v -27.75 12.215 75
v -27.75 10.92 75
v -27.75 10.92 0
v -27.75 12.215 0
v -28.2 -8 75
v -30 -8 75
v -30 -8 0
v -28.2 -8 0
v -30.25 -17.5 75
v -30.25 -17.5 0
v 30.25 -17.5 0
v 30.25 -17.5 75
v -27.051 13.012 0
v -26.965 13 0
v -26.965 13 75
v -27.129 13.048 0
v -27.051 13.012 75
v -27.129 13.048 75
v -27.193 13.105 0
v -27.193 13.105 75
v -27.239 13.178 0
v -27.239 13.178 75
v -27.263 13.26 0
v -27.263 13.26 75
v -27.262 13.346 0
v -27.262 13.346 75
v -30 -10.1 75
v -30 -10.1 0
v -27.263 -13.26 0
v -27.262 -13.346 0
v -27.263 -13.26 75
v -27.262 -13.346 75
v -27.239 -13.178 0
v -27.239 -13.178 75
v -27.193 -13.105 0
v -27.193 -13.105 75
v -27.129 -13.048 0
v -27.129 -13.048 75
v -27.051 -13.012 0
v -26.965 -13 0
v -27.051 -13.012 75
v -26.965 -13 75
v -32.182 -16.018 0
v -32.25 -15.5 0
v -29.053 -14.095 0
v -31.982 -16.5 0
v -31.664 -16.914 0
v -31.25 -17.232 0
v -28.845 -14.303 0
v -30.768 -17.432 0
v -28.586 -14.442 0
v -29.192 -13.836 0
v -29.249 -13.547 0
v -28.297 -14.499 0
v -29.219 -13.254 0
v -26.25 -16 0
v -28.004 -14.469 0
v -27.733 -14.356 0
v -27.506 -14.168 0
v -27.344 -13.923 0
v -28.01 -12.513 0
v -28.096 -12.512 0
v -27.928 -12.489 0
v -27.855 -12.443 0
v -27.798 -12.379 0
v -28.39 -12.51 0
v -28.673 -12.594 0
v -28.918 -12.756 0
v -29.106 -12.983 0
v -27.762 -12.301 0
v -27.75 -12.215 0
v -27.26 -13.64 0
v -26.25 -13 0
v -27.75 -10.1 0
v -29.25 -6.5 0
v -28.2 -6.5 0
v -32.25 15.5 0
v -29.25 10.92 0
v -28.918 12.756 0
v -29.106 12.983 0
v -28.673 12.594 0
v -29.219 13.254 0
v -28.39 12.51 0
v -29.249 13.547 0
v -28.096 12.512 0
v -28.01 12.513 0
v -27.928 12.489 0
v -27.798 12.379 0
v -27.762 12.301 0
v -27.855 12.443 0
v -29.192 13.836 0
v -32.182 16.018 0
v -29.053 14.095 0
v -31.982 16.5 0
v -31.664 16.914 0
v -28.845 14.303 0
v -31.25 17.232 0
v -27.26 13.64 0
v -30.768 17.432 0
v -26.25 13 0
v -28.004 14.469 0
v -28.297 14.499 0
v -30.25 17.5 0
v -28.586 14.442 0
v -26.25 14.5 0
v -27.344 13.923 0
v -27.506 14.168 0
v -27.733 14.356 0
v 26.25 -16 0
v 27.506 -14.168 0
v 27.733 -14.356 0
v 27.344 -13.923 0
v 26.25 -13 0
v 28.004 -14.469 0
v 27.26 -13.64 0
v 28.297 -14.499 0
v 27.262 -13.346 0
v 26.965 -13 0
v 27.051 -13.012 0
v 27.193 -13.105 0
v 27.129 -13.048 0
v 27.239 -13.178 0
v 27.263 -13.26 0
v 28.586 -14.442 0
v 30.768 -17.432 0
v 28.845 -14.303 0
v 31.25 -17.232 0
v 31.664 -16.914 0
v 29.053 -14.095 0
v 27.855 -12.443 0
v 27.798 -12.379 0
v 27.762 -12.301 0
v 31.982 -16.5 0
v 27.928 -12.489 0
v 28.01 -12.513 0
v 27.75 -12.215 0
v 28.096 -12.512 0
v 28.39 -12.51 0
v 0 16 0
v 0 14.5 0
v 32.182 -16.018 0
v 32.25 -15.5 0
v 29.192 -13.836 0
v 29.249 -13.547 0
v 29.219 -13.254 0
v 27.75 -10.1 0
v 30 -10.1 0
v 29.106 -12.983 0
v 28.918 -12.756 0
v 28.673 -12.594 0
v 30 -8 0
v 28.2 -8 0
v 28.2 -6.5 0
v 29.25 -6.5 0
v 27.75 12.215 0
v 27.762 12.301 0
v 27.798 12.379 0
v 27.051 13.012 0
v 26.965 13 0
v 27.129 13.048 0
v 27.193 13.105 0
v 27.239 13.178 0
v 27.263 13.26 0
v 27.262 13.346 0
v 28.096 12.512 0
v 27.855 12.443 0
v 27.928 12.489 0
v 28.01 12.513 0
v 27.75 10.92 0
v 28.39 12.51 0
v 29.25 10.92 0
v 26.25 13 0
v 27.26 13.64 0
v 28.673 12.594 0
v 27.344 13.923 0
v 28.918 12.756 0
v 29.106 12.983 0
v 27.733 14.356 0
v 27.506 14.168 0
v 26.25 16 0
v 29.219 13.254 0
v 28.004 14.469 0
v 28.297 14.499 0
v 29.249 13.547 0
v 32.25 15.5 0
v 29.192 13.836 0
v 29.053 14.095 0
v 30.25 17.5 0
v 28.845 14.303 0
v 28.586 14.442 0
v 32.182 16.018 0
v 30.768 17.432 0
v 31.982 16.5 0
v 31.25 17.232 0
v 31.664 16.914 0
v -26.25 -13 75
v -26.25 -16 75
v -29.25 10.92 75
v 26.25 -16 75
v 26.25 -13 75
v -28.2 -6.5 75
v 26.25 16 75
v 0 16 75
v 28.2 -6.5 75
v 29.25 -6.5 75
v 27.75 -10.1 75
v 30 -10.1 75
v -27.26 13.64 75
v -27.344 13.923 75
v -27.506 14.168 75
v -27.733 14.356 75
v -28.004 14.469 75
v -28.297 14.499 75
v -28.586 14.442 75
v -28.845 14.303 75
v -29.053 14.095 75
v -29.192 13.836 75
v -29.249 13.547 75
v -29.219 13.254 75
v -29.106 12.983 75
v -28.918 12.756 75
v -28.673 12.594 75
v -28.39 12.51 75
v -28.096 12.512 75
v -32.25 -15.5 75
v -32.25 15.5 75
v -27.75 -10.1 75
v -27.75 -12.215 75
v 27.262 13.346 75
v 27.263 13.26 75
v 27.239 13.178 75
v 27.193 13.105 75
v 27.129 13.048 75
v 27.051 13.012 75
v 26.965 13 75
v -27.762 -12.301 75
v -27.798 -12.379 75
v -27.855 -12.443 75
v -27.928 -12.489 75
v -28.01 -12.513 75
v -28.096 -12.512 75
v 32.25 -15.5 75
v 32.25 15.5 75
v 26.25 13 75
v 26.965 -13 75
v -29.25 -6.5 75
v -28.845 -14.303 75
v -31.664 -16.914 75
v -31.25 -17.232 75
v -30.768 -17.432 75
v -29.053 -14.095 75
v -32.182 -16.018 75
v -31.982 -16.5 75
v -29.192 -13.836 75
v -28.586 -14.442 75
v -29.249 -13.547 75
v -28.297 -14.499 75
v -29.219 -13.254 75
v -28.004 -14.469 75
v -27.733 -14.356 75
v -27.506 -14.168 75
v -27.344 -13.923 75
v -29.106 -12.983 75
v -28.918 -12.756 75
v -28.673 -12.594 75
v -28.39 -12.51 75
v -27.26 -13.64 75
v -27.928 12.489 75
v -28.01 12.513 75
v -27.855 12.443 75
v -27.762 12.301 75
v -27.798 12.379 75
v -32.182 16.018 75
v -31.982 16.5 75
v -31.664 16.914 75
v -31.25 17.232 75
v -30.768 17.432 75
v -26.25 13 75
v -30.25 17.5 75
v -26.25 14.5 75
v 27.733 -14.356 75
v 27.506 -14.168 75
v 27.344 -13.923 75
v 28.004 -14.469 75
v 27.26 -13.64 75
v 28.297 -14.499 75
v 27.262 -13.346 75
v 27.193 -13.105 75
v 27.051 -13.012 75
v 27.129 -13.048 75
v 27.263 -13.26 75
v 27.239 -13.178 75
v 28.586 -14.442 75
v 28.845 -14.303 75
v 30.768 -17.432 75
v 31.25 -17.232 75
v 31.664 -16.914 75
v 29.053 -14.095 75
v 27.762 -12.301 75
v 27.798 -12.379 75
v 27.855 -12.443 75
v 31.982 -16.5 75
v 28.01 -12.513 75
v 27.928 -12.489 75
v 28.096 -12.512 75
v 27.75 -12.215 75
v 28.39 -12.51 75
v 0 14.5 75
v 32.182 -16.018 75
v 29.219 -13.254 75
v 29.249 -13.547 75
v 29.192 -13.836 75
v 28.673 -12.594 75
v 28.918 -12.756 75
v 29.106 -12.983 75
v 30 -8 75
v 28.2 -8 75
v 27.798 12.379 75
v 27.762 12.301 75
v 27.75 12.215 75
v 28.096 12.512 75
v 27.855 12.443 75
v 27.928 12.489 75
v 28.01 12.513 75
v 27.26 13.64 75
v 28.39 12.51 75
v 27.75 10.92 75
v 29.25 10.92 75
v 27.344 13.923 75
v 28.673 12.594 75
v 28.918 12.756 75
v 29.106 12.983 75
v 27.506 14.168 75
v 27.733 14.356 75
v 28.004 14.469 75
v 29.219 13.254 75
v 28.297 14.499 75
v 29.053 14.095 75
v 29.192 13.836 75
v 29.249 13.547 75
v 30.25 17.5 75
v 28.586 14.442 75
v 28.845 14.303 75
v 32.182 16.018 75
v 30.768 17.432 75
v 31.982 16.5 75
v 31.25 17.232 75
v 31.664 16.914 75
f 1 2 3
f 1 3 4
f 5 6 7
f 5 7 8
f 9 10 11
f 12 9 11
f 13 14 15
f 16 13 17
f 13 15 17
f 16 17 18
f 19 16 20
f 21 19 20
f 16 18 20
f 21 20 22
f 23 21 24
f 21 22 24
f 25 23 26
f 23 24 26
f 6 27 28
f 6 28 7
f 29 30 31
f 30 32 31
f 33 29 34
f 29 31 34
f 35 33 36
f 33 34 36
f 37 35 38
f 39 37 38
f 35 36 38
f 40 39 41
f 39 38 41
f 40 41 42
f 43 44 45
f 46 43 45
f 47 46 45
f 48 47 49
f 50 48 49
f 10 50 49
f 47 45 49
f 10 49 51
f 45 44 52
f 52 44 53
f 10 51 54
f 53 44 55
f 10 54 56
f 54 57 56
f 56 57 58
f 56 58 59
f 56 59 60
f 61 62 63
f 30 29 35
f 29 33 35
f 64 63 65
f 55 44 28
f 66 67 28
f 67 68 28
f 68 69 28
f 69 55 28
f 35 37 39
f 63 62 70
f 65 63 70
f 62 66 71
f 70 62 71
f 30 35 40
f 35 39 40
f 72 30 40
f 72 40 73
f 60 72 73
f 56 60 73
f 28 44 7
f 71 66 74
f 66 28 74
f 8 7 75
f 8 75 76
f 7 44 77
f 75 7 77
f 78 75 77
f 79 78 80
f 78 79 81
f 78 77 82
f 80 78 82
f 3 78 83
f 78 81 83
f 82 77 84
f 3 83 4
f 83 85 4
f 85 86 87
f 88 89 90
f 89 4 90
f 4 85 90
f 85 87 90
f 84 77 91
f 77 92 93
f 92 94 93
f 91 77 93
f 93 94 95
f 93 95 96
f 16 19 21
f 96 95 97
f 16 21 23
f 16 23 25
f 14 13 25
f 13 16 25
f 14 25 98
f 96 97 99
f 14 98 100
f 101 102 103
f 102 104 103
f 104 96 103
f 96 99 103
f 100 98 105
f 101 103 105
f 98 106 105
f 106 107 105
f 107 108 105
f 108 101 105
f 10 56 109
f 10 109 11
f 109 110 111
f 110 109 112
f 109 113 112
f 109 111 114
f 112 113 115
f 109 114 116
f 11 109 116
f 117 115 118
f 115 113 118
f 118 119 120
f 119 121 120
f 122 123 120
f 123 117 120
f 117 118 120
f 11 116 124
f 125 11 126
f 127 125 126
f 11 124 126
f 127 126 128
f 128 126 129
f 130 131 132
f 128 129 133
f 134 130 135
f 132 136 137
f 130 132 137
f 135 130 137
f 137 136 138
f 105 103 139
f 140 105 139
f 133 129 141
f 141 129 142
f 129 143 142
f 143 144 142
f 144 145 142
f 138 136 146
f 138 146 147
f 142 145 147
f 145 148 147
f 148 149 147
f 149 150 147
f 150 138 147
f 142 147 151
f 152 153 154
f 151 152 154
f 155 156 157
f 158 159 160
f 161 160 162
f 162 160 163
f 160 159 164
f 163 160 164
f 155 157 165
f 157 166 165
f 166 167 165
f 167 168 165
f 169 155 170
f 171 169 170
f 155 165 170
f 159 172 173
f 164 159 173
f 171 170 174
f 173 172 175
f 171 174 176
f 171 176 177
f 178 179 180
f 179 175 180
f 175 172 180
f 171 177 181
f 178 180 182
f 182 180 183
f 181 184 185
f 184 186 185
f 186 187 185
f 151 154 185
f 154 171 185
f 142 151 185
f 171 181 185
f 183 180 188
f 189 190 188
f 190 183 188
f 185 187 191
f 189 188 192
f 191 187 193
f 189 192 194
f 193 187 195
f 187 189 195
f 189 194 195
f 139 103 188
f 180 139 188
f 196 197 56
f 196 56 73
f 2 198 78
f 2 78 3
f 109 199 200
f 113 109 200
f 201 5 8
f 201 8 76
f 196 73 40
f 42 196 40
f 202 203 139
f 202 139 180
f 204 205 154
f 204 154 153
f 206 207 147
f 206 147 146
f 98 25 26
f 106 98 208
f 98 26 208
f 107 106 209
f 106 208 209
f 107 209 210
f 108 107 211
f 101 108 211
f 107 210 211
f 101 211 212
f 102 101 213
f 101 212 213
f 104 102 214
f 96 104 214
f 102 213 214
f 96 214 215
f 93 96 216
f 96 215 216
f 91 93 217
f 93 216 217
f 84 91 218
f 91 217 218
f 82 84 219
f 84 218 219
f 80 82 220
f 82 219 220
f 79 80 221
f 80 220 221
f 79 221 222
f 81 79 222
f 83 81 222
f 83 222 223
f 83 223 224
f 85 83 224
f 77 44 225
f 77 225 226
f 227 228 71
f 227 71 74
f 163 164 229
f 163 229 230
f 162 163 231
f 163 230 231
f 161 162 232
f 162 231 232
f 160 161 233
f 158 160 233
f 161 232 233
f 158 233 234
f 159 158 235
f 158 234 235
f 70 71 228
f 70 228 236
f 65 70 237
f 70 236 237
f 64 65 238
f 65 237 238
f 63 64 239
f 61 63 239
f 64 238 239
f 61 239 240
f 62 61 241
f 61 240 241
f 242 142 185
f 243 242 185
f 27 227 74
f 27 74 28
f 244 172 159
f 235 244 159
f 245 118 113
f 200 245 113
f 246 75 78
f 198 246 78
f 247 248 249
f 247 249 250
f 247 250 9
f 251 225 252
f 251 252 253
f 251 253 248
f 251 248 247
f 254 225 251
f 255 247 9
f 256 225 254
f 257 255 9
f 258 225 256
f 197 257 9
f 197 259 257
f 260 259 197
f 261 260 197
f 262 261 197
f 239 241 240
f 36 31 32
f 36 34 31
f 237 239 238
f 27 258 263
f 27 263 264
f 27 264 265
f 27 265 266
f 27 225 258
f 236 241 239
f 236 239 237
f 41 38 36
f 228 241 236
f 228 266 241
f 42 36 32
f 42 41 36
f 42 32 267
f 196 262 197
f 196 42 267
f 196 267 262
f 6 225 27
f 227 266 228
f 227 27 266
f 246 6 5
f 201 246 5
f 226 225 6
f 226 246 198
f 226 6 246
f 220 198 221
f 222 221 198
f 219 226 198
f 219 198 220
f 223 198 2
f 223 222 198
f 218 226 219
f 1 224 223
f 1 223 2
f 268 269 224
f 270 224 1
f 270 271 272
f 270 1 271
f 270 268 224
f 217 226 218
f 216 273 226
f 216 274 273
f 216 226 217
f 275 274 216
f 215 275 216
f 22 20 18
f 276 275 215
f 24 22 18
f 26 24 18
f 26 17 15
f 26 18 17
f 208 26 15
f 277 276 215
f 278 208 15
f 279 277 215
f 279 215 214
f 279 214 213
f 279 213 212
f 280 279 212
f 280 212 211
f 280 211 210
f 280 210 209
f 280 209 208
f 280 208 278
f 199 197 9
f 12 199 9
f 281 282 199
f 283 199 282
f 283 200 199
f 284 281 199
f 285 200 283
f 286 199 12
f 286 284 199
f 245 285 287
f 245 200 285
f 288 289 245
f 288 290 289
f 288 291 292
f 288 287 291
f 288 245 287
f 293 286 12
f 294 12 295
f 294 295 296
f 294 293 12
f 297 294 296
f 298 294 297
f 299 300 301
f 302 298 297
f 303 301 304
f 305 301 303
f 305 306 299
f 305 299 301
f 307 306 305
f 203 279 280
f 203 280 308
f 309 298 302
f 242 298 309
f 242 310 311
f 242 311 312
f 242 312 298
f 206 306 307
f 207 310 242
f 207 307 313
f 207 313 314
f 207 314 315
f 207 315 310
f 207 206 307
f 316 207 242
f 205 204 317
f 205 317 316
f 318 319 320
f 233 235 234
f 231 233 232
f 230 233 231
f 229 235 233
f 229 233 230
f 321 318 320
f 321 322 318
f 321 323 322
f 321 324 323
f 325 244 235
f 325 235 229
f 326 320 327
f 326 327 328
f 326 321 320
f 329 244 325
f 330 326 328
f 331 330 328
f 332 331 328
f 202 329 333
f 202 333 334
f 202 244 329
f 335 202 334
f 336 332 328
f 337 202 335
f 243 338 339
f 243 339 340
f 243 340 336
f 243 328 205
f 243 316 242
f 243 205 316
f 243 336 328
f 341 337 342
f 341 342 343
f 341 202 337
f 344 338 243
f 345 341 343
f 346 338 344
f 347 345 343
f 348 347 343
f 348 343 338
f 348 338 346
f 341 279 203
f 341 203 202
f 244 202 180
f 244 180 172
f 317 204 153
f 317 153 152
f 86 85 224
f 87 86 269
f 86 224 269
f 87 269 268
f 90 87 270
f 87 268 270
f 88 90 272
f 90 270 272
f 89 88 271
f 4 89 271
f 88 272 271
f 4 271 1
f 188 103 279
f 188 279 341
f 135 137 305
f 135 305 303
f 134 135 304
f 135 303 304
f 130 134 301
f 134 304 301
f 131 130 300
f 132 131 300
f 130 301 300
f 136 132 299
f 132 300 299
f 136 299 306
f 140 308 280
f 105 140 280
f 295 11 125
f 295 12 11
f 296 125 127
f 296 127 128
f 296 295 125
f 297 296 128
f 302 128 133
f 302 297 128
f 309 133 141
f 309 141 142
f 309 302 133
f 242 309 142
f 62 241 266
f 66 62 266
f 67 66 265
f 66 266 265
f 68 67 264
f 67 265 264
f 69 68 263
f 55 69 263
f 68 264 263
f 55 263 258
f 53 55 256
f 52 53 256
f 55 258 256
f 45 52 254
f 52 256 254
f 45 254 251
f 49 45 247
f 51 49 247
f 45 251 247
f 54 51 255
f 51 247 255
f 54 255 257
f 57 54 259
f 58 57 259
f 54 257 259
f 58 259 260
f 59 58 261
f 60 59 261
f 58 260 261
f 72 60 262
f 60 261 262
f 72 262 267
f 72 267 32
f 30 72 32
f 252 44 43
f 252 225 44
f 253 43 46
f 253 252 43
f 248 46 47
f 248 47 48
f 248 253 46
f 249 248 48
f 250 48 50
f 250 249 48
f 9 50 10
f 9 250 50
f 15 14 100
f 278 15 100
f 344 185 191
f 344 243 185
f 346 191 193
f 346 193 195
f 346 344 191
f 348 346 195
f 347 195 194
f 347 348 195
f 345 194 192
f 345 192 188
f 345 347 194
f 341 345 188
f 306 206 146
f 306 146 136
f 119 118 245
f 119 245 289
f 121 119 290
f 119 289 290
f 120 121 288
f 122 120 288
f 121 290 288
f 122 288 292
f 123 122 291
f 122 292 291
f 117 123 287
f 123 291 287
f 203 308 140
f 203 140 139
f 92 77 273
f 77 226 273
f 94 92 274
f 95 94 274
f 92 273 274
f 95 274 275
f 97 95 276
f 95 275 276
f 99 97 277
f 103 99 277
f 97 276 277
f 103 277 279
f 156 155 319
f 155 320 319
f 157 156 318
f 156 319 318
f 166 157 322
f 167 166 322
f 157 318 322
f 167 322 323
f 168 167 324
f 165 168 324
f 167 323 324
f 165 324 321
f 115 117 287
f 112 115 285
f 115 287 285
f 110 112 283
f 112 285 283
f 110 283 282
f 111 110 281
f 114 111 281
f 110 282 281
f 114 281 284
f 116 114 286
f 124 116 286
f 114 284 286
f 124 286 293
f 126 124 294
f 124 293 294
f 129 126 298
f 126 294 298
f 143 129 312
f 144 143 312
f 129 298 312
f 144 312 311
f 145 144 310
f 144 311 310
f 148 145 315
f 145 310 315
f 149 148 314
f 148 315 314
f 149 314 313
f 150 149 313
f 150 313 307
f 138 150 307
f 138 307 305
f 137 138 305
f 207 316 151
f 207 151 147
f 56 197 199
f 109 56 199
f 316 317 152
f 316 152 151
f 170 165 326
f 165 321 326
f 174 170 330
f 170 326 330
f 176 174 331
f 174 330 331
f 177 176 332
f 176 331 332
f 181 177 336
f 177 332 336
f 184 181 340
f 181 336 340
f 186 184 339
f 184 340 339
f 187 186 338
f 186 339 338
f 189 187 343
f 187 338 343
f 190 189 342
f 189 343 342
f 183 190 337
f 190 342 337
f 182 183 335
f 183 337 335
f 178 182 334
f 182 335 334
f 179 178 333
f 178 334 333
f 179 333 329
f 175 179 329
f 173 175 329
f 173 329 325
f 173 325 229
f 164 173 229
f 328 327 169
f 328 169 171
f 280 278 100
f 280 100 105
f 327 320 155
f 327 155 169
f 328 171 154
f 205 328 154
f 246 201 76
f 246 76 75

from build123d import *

# Parameters (mm, degrees)
SKETCH1_W           = 64.5
SKETCH1_H           = 35
BOSS_EXTRUDE1_DEPTH = 75
FILLET1_R           = 2
SKETCH2_R           = 1
FIX_2_DEPTH         = 76
CUT_EXTRUDE2_DEPTH  = 75
CUT_EXTRUDE3_DEPTH  = 75
SKETCH5_W           = 26.25
SKETCH5_H           = 1.5
CUT_EXTRUDE4_DEPTH  = 75
FILLET2_R           = 0.3
SKETCH6_W           = 52.5
SKETCH6_H           = 1.5
BAS_DEPTH           = 76


with BuildPart() as part:
    # Sketch1 → Boss-Extrude1 (new body)
    with BuildSketch(Plane.XY):
        Rectangle(SKETCH1_W, SKETCH1_H)
    extrude(amount=BOSS_EXTRUDE1_DEPTH)

    # Fillet1
    fillet1_edges = [part.edges().sort_by_distance(p)[0] for p in [
        (32.25, -17.5, 37.5),
        (-32.25, -17.5, 37.5),
        (-32.25, 17.5, 37.5),
        (32.25, 17.5, 37.5),
    ]]
    fillet(fillet1_edges, radius=FILLET1_R)

    # Sketch2 → fix 2 (cut, through all)
    with BuildSketch(Plane.XY.offset(75)):
        with Locations((-28.25, 13.5)):
            Circle(SKETCH2_R)
        with Locations((-28.25, -13.5)):
            Circle(SKETCH2_R)
        with Locations((28.25, -13.5)):
            Circle(SKETCH2_R)
        with Locations((28.25, 13.5)):
            Circle(SKETCH2_R)
    extrude(amount=-FIX_2_DEPTH, mode=Mode.SUBTRACT)

    # Sketch3 → Cut-Extrude2 (cut)
    with BuildSketch(Plane.XY.offset(75)):
        Polygon((-27.75, 10.92), (-27.75, 13), (-26.25, 13), (-26.25, 14.5), (0, 14.5), (26.25, 14.5), (26.25, 13), (27.75, 13), (27.75, 10.92), (29.25, 10.92), (29.25, -6.5), (27.75, -6.5), (27.75, -13), (26.25, -13), (26.25, -14.5), (0, -14.5), (-26.25, -14.5), (-26.25, -13), (-27.75, -13), (-27.75, -6.5), (-29.25, -6.5), (-29.25, 10.92), align=None)
    extrude(amount=-CUT_EXTRUDE2_DEPTH, mode=Mode.SUBTRACT)

    # Sketch4 → Cut-Extrude3 (cut)
    with BuildSketch(Plane.XY.offset(75)):
        Polygon((-30, -8), (-28.2, -8), (-28.2, -4.99063684), (28.2, -5.371209777), (28.2, -8), (30, -8), (30, -10.1), (-30, -10.1), align=None)
    extrude(amount=-CUT_EXTRUDE3_DEPTH, mode=Mode.SUBTRACT)

    # Sketch5 → Cut-Extrude4 (cut)
    with BuildSketch(Plane.XY.offset(75)):
        with Locations((13.125, 15.25)):
            Rectangle(SKETCH5_W, SKETCH5_H)
    extrude(amount=-CUT_EXTRUDE4_DEPTH, mode=Mode.SUBTRACT)

    # Fillet2
    fillet2_edges = [part.edges().sort_by_distance(p)[0] for p in [
        (27.75, 12.633974596, 37.5),
        (27.383974596, 13, 37.5),
        (27.383974596, -13, 37.5),
        (27.75, -12.633974596, 37.5),
        (-27.75, -12.633974596, 37.5),
        (-27.383974596, -13, 37.5),
        (-27.383974596, 13, 37.5),
        (-27.75, 12.633974596, 37.5),
    ]]
    fillet(fillet2_edges, radius=FILLET2_R)

    # Sketch6 → bas (cut, through all)
    with BuildSketch(Plane.XY.offset(75)):
        with Locations((0, -15.25)):
            Rectangle(SKETCH6_W, SKETCH6_H)
    extrude(amount=-BAS_DEPTH, mode=Mode.SUBTRACT)


solid = part.part
